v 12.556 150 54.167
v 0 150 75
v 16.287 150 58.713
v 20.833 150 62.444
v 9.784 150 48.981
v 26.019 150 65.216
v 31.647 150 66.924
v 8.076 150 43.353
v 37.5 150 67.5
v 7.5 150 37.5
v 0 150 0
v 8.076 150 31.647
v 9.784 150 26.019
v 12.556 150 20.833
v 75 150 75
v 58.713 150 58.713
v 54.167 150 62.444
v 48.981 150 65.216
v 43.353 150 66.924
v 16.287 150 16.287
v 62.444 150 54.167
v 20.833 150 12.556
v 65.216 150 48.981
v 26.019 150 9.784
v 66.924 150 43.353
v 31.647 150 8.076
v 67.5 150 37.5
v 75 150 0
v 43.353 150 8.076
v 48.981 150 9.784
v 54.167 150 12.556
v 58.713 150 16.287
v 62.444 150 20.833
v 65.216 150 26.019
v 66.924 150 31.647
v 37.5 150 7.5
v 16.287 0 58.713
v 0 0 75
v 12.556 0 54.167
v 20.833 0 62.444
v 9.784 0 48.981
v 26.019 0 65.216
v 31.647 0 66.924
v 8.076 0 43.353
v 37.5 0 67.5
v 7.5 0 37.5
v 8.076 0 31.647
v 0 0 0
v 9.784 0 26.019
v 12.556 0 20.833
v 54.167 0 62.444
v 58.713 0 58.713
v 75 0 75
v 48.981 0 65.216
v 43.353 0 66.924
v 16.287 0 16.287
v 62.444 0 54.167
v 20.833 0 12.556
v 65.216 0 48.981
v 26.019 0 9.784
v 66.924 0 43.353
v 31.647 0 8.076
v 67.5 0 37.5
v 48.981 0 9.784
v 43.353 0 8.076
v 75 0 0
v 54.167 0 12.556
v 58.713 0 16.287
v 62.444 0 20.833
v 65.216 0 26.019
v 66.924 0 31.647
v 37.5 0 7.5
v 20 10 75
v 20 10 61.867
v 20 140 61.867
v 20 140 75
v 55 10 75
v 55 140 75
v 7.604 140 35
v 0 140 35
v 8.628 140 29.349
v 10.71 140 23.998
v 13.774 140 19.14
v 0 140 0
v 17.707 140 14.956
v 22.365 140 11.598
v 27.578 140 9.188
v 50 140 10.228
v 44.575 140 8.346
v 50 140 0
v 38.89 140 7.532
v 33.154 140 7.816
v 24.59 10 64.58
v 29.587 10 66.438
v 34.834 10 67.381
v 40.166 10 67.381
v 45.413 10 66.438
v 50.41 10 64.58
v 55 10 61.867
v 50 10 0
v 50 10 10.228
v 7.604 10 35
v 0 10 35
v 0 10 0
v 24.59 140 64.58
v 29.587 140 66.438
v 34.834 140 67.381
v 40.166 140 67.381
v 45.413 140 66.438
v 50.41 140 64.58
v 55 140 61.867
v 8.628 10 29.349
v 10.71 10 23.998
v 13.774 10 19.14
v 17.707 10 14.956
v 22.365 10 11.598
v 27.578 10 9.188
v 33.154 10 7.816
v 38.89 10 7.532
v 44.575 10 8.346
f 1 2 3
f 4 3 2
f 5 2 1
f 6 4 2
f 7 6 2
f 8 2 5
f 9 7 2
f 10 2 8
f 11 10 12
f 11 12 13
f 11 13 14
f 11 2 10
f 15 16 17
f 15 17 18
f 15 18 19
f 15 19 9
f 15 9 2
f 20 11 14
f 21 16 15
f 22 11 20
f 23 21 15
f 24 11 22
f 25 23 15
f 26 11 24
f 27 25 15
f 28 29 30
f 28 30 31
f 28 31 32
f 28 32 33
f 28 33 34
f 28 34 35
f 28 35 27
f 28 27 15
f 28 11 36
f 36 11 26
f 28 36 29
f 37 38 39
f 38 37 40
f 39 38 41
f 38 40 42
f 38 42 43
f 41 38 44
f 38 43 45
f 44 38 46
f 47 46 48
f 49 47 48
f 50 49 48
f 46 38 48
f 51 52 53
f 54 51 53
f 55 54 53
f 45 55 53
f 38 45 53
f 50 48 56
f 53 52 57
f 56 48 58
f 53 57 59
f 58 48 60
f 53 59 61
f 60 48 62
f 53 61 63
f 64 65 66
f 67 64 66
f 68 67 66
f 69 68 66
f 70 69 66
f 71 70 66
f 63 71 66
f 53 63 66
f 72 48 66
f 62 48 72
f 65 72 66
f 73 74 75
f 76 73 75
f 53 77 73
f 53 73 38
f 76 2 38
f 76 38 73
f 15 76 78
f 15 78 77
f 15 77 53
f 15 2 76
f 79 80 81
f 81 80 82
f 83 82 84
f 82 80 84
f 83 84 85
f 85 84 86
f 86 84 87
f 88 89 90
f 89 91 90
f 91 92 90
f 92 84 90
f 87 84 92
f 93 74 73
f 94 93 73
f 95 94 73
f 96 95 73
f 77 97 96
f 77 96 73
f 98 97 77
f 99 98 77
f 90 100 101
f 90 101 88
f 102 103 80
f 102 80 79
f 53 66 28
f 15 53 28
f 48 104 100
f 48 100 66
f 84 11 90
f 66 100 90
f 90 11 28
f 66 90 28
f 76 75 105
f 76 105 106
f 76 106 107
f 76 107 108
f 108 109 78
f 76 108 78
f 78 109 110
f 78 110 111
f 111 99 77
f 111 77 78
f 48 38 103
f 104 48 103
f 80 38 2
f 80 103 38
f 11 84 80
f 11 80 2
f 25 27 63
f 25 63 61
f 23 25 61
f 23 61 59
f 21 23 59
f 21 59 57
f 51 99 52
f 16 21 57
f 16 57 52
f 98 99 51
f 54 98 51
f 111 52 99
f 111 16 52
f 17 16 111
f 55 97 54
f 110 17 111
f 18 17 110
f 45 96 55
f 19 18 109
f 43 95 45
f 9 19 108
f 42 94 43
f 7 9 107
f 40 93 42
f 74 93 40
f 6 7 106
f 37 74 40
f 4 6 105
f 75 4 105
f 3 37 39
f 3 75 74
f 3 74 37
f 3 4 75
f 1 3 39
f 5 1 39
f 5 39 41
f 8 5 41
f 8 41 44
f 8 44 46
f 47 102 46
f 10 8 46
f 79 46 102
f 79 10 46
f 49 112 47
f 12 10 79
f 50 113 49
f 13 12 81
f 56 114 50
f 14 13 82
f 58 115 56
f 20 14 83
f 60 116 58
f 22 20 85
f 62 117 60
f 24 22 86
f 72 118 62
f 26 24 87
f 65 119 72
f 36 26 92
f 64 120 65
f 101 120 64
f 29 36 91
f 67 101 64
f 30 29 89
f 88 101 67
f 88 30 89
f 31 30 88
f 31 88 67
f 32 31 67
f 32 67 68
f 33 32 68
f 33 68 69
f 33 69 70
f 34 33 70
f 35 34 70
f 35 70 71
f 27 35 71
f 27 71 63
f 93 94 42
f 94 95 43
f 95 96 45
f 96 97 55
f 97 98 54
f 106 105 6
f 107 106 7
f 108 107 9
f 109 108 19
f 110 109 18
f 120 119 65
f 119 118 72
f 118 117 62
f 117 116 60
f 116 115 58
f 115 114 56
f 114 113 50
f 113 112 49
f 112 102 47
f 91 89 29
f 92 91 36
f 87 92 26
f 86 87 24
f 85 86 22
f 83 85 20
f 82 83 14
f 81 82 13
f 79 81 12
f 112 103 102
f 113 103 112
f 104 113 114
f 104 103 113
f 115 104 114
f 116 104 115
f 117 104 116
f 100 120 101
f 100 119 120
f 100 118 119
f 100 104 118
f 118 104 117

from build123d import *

# Parameters (mm, degrees)
BOX_W          = 75
BOX_H          = 150
BOX_DEPTH      = 75
CYLINDER_R     = 30
CYLINDER_DEPTH = 150
BOX001_W       = 35
BOX001_H       = 130
BOX001_DEPTH   = 35
BOX002_W       = 50
BOX002_H       = 130
BOX002_DEPTH   = 35


with BuildPart() as part:
    # Box → Box (join)
    with BuildSketch(Plane.XY):
        with Locations((37.5, 75)):
            Rectangle(BOX_W, BOX_H)
    extrude(amount=BOX_DEPTH)

    # Cylinder → Cylinder (cut)
    with BuildSketch(Plane(origin=(37.5, 150, 37.5), x_dir=(1, 0, 0), z_dir=(0, -1, 0))):
        Circle(CYLINDER_R)
    extrude(amount=CYLINDER_DEPTH, mode=Mode.SUBTRACT)

    # Box001 → Box001 (cut)
    with BuildSketch(Plane(origin=(20, 10, 40), x_dir=(1, 0, 0), z_dir=(0, 0, 1))):
        with Locations((17.5, 65)):
            Rectangle(BOX001_W, BOX001_H)
    extrude(amount=BOX001_DEPTH, mode=Mode.SUBTRACT)

    # Box002 → Box002 (cut)
    with BuildSketch(Plane(origin=(0, 10, 0), x_dir=(1, 0, 0), z_dir=(0, 0, 1))):
        with Locations((25, 65)):
            Rectangle(BOX002_W, BOX002_H)
    extrude(amount=BOX002_DEPTH, mode=Mode.SUBTRACT)


solid = part.part
